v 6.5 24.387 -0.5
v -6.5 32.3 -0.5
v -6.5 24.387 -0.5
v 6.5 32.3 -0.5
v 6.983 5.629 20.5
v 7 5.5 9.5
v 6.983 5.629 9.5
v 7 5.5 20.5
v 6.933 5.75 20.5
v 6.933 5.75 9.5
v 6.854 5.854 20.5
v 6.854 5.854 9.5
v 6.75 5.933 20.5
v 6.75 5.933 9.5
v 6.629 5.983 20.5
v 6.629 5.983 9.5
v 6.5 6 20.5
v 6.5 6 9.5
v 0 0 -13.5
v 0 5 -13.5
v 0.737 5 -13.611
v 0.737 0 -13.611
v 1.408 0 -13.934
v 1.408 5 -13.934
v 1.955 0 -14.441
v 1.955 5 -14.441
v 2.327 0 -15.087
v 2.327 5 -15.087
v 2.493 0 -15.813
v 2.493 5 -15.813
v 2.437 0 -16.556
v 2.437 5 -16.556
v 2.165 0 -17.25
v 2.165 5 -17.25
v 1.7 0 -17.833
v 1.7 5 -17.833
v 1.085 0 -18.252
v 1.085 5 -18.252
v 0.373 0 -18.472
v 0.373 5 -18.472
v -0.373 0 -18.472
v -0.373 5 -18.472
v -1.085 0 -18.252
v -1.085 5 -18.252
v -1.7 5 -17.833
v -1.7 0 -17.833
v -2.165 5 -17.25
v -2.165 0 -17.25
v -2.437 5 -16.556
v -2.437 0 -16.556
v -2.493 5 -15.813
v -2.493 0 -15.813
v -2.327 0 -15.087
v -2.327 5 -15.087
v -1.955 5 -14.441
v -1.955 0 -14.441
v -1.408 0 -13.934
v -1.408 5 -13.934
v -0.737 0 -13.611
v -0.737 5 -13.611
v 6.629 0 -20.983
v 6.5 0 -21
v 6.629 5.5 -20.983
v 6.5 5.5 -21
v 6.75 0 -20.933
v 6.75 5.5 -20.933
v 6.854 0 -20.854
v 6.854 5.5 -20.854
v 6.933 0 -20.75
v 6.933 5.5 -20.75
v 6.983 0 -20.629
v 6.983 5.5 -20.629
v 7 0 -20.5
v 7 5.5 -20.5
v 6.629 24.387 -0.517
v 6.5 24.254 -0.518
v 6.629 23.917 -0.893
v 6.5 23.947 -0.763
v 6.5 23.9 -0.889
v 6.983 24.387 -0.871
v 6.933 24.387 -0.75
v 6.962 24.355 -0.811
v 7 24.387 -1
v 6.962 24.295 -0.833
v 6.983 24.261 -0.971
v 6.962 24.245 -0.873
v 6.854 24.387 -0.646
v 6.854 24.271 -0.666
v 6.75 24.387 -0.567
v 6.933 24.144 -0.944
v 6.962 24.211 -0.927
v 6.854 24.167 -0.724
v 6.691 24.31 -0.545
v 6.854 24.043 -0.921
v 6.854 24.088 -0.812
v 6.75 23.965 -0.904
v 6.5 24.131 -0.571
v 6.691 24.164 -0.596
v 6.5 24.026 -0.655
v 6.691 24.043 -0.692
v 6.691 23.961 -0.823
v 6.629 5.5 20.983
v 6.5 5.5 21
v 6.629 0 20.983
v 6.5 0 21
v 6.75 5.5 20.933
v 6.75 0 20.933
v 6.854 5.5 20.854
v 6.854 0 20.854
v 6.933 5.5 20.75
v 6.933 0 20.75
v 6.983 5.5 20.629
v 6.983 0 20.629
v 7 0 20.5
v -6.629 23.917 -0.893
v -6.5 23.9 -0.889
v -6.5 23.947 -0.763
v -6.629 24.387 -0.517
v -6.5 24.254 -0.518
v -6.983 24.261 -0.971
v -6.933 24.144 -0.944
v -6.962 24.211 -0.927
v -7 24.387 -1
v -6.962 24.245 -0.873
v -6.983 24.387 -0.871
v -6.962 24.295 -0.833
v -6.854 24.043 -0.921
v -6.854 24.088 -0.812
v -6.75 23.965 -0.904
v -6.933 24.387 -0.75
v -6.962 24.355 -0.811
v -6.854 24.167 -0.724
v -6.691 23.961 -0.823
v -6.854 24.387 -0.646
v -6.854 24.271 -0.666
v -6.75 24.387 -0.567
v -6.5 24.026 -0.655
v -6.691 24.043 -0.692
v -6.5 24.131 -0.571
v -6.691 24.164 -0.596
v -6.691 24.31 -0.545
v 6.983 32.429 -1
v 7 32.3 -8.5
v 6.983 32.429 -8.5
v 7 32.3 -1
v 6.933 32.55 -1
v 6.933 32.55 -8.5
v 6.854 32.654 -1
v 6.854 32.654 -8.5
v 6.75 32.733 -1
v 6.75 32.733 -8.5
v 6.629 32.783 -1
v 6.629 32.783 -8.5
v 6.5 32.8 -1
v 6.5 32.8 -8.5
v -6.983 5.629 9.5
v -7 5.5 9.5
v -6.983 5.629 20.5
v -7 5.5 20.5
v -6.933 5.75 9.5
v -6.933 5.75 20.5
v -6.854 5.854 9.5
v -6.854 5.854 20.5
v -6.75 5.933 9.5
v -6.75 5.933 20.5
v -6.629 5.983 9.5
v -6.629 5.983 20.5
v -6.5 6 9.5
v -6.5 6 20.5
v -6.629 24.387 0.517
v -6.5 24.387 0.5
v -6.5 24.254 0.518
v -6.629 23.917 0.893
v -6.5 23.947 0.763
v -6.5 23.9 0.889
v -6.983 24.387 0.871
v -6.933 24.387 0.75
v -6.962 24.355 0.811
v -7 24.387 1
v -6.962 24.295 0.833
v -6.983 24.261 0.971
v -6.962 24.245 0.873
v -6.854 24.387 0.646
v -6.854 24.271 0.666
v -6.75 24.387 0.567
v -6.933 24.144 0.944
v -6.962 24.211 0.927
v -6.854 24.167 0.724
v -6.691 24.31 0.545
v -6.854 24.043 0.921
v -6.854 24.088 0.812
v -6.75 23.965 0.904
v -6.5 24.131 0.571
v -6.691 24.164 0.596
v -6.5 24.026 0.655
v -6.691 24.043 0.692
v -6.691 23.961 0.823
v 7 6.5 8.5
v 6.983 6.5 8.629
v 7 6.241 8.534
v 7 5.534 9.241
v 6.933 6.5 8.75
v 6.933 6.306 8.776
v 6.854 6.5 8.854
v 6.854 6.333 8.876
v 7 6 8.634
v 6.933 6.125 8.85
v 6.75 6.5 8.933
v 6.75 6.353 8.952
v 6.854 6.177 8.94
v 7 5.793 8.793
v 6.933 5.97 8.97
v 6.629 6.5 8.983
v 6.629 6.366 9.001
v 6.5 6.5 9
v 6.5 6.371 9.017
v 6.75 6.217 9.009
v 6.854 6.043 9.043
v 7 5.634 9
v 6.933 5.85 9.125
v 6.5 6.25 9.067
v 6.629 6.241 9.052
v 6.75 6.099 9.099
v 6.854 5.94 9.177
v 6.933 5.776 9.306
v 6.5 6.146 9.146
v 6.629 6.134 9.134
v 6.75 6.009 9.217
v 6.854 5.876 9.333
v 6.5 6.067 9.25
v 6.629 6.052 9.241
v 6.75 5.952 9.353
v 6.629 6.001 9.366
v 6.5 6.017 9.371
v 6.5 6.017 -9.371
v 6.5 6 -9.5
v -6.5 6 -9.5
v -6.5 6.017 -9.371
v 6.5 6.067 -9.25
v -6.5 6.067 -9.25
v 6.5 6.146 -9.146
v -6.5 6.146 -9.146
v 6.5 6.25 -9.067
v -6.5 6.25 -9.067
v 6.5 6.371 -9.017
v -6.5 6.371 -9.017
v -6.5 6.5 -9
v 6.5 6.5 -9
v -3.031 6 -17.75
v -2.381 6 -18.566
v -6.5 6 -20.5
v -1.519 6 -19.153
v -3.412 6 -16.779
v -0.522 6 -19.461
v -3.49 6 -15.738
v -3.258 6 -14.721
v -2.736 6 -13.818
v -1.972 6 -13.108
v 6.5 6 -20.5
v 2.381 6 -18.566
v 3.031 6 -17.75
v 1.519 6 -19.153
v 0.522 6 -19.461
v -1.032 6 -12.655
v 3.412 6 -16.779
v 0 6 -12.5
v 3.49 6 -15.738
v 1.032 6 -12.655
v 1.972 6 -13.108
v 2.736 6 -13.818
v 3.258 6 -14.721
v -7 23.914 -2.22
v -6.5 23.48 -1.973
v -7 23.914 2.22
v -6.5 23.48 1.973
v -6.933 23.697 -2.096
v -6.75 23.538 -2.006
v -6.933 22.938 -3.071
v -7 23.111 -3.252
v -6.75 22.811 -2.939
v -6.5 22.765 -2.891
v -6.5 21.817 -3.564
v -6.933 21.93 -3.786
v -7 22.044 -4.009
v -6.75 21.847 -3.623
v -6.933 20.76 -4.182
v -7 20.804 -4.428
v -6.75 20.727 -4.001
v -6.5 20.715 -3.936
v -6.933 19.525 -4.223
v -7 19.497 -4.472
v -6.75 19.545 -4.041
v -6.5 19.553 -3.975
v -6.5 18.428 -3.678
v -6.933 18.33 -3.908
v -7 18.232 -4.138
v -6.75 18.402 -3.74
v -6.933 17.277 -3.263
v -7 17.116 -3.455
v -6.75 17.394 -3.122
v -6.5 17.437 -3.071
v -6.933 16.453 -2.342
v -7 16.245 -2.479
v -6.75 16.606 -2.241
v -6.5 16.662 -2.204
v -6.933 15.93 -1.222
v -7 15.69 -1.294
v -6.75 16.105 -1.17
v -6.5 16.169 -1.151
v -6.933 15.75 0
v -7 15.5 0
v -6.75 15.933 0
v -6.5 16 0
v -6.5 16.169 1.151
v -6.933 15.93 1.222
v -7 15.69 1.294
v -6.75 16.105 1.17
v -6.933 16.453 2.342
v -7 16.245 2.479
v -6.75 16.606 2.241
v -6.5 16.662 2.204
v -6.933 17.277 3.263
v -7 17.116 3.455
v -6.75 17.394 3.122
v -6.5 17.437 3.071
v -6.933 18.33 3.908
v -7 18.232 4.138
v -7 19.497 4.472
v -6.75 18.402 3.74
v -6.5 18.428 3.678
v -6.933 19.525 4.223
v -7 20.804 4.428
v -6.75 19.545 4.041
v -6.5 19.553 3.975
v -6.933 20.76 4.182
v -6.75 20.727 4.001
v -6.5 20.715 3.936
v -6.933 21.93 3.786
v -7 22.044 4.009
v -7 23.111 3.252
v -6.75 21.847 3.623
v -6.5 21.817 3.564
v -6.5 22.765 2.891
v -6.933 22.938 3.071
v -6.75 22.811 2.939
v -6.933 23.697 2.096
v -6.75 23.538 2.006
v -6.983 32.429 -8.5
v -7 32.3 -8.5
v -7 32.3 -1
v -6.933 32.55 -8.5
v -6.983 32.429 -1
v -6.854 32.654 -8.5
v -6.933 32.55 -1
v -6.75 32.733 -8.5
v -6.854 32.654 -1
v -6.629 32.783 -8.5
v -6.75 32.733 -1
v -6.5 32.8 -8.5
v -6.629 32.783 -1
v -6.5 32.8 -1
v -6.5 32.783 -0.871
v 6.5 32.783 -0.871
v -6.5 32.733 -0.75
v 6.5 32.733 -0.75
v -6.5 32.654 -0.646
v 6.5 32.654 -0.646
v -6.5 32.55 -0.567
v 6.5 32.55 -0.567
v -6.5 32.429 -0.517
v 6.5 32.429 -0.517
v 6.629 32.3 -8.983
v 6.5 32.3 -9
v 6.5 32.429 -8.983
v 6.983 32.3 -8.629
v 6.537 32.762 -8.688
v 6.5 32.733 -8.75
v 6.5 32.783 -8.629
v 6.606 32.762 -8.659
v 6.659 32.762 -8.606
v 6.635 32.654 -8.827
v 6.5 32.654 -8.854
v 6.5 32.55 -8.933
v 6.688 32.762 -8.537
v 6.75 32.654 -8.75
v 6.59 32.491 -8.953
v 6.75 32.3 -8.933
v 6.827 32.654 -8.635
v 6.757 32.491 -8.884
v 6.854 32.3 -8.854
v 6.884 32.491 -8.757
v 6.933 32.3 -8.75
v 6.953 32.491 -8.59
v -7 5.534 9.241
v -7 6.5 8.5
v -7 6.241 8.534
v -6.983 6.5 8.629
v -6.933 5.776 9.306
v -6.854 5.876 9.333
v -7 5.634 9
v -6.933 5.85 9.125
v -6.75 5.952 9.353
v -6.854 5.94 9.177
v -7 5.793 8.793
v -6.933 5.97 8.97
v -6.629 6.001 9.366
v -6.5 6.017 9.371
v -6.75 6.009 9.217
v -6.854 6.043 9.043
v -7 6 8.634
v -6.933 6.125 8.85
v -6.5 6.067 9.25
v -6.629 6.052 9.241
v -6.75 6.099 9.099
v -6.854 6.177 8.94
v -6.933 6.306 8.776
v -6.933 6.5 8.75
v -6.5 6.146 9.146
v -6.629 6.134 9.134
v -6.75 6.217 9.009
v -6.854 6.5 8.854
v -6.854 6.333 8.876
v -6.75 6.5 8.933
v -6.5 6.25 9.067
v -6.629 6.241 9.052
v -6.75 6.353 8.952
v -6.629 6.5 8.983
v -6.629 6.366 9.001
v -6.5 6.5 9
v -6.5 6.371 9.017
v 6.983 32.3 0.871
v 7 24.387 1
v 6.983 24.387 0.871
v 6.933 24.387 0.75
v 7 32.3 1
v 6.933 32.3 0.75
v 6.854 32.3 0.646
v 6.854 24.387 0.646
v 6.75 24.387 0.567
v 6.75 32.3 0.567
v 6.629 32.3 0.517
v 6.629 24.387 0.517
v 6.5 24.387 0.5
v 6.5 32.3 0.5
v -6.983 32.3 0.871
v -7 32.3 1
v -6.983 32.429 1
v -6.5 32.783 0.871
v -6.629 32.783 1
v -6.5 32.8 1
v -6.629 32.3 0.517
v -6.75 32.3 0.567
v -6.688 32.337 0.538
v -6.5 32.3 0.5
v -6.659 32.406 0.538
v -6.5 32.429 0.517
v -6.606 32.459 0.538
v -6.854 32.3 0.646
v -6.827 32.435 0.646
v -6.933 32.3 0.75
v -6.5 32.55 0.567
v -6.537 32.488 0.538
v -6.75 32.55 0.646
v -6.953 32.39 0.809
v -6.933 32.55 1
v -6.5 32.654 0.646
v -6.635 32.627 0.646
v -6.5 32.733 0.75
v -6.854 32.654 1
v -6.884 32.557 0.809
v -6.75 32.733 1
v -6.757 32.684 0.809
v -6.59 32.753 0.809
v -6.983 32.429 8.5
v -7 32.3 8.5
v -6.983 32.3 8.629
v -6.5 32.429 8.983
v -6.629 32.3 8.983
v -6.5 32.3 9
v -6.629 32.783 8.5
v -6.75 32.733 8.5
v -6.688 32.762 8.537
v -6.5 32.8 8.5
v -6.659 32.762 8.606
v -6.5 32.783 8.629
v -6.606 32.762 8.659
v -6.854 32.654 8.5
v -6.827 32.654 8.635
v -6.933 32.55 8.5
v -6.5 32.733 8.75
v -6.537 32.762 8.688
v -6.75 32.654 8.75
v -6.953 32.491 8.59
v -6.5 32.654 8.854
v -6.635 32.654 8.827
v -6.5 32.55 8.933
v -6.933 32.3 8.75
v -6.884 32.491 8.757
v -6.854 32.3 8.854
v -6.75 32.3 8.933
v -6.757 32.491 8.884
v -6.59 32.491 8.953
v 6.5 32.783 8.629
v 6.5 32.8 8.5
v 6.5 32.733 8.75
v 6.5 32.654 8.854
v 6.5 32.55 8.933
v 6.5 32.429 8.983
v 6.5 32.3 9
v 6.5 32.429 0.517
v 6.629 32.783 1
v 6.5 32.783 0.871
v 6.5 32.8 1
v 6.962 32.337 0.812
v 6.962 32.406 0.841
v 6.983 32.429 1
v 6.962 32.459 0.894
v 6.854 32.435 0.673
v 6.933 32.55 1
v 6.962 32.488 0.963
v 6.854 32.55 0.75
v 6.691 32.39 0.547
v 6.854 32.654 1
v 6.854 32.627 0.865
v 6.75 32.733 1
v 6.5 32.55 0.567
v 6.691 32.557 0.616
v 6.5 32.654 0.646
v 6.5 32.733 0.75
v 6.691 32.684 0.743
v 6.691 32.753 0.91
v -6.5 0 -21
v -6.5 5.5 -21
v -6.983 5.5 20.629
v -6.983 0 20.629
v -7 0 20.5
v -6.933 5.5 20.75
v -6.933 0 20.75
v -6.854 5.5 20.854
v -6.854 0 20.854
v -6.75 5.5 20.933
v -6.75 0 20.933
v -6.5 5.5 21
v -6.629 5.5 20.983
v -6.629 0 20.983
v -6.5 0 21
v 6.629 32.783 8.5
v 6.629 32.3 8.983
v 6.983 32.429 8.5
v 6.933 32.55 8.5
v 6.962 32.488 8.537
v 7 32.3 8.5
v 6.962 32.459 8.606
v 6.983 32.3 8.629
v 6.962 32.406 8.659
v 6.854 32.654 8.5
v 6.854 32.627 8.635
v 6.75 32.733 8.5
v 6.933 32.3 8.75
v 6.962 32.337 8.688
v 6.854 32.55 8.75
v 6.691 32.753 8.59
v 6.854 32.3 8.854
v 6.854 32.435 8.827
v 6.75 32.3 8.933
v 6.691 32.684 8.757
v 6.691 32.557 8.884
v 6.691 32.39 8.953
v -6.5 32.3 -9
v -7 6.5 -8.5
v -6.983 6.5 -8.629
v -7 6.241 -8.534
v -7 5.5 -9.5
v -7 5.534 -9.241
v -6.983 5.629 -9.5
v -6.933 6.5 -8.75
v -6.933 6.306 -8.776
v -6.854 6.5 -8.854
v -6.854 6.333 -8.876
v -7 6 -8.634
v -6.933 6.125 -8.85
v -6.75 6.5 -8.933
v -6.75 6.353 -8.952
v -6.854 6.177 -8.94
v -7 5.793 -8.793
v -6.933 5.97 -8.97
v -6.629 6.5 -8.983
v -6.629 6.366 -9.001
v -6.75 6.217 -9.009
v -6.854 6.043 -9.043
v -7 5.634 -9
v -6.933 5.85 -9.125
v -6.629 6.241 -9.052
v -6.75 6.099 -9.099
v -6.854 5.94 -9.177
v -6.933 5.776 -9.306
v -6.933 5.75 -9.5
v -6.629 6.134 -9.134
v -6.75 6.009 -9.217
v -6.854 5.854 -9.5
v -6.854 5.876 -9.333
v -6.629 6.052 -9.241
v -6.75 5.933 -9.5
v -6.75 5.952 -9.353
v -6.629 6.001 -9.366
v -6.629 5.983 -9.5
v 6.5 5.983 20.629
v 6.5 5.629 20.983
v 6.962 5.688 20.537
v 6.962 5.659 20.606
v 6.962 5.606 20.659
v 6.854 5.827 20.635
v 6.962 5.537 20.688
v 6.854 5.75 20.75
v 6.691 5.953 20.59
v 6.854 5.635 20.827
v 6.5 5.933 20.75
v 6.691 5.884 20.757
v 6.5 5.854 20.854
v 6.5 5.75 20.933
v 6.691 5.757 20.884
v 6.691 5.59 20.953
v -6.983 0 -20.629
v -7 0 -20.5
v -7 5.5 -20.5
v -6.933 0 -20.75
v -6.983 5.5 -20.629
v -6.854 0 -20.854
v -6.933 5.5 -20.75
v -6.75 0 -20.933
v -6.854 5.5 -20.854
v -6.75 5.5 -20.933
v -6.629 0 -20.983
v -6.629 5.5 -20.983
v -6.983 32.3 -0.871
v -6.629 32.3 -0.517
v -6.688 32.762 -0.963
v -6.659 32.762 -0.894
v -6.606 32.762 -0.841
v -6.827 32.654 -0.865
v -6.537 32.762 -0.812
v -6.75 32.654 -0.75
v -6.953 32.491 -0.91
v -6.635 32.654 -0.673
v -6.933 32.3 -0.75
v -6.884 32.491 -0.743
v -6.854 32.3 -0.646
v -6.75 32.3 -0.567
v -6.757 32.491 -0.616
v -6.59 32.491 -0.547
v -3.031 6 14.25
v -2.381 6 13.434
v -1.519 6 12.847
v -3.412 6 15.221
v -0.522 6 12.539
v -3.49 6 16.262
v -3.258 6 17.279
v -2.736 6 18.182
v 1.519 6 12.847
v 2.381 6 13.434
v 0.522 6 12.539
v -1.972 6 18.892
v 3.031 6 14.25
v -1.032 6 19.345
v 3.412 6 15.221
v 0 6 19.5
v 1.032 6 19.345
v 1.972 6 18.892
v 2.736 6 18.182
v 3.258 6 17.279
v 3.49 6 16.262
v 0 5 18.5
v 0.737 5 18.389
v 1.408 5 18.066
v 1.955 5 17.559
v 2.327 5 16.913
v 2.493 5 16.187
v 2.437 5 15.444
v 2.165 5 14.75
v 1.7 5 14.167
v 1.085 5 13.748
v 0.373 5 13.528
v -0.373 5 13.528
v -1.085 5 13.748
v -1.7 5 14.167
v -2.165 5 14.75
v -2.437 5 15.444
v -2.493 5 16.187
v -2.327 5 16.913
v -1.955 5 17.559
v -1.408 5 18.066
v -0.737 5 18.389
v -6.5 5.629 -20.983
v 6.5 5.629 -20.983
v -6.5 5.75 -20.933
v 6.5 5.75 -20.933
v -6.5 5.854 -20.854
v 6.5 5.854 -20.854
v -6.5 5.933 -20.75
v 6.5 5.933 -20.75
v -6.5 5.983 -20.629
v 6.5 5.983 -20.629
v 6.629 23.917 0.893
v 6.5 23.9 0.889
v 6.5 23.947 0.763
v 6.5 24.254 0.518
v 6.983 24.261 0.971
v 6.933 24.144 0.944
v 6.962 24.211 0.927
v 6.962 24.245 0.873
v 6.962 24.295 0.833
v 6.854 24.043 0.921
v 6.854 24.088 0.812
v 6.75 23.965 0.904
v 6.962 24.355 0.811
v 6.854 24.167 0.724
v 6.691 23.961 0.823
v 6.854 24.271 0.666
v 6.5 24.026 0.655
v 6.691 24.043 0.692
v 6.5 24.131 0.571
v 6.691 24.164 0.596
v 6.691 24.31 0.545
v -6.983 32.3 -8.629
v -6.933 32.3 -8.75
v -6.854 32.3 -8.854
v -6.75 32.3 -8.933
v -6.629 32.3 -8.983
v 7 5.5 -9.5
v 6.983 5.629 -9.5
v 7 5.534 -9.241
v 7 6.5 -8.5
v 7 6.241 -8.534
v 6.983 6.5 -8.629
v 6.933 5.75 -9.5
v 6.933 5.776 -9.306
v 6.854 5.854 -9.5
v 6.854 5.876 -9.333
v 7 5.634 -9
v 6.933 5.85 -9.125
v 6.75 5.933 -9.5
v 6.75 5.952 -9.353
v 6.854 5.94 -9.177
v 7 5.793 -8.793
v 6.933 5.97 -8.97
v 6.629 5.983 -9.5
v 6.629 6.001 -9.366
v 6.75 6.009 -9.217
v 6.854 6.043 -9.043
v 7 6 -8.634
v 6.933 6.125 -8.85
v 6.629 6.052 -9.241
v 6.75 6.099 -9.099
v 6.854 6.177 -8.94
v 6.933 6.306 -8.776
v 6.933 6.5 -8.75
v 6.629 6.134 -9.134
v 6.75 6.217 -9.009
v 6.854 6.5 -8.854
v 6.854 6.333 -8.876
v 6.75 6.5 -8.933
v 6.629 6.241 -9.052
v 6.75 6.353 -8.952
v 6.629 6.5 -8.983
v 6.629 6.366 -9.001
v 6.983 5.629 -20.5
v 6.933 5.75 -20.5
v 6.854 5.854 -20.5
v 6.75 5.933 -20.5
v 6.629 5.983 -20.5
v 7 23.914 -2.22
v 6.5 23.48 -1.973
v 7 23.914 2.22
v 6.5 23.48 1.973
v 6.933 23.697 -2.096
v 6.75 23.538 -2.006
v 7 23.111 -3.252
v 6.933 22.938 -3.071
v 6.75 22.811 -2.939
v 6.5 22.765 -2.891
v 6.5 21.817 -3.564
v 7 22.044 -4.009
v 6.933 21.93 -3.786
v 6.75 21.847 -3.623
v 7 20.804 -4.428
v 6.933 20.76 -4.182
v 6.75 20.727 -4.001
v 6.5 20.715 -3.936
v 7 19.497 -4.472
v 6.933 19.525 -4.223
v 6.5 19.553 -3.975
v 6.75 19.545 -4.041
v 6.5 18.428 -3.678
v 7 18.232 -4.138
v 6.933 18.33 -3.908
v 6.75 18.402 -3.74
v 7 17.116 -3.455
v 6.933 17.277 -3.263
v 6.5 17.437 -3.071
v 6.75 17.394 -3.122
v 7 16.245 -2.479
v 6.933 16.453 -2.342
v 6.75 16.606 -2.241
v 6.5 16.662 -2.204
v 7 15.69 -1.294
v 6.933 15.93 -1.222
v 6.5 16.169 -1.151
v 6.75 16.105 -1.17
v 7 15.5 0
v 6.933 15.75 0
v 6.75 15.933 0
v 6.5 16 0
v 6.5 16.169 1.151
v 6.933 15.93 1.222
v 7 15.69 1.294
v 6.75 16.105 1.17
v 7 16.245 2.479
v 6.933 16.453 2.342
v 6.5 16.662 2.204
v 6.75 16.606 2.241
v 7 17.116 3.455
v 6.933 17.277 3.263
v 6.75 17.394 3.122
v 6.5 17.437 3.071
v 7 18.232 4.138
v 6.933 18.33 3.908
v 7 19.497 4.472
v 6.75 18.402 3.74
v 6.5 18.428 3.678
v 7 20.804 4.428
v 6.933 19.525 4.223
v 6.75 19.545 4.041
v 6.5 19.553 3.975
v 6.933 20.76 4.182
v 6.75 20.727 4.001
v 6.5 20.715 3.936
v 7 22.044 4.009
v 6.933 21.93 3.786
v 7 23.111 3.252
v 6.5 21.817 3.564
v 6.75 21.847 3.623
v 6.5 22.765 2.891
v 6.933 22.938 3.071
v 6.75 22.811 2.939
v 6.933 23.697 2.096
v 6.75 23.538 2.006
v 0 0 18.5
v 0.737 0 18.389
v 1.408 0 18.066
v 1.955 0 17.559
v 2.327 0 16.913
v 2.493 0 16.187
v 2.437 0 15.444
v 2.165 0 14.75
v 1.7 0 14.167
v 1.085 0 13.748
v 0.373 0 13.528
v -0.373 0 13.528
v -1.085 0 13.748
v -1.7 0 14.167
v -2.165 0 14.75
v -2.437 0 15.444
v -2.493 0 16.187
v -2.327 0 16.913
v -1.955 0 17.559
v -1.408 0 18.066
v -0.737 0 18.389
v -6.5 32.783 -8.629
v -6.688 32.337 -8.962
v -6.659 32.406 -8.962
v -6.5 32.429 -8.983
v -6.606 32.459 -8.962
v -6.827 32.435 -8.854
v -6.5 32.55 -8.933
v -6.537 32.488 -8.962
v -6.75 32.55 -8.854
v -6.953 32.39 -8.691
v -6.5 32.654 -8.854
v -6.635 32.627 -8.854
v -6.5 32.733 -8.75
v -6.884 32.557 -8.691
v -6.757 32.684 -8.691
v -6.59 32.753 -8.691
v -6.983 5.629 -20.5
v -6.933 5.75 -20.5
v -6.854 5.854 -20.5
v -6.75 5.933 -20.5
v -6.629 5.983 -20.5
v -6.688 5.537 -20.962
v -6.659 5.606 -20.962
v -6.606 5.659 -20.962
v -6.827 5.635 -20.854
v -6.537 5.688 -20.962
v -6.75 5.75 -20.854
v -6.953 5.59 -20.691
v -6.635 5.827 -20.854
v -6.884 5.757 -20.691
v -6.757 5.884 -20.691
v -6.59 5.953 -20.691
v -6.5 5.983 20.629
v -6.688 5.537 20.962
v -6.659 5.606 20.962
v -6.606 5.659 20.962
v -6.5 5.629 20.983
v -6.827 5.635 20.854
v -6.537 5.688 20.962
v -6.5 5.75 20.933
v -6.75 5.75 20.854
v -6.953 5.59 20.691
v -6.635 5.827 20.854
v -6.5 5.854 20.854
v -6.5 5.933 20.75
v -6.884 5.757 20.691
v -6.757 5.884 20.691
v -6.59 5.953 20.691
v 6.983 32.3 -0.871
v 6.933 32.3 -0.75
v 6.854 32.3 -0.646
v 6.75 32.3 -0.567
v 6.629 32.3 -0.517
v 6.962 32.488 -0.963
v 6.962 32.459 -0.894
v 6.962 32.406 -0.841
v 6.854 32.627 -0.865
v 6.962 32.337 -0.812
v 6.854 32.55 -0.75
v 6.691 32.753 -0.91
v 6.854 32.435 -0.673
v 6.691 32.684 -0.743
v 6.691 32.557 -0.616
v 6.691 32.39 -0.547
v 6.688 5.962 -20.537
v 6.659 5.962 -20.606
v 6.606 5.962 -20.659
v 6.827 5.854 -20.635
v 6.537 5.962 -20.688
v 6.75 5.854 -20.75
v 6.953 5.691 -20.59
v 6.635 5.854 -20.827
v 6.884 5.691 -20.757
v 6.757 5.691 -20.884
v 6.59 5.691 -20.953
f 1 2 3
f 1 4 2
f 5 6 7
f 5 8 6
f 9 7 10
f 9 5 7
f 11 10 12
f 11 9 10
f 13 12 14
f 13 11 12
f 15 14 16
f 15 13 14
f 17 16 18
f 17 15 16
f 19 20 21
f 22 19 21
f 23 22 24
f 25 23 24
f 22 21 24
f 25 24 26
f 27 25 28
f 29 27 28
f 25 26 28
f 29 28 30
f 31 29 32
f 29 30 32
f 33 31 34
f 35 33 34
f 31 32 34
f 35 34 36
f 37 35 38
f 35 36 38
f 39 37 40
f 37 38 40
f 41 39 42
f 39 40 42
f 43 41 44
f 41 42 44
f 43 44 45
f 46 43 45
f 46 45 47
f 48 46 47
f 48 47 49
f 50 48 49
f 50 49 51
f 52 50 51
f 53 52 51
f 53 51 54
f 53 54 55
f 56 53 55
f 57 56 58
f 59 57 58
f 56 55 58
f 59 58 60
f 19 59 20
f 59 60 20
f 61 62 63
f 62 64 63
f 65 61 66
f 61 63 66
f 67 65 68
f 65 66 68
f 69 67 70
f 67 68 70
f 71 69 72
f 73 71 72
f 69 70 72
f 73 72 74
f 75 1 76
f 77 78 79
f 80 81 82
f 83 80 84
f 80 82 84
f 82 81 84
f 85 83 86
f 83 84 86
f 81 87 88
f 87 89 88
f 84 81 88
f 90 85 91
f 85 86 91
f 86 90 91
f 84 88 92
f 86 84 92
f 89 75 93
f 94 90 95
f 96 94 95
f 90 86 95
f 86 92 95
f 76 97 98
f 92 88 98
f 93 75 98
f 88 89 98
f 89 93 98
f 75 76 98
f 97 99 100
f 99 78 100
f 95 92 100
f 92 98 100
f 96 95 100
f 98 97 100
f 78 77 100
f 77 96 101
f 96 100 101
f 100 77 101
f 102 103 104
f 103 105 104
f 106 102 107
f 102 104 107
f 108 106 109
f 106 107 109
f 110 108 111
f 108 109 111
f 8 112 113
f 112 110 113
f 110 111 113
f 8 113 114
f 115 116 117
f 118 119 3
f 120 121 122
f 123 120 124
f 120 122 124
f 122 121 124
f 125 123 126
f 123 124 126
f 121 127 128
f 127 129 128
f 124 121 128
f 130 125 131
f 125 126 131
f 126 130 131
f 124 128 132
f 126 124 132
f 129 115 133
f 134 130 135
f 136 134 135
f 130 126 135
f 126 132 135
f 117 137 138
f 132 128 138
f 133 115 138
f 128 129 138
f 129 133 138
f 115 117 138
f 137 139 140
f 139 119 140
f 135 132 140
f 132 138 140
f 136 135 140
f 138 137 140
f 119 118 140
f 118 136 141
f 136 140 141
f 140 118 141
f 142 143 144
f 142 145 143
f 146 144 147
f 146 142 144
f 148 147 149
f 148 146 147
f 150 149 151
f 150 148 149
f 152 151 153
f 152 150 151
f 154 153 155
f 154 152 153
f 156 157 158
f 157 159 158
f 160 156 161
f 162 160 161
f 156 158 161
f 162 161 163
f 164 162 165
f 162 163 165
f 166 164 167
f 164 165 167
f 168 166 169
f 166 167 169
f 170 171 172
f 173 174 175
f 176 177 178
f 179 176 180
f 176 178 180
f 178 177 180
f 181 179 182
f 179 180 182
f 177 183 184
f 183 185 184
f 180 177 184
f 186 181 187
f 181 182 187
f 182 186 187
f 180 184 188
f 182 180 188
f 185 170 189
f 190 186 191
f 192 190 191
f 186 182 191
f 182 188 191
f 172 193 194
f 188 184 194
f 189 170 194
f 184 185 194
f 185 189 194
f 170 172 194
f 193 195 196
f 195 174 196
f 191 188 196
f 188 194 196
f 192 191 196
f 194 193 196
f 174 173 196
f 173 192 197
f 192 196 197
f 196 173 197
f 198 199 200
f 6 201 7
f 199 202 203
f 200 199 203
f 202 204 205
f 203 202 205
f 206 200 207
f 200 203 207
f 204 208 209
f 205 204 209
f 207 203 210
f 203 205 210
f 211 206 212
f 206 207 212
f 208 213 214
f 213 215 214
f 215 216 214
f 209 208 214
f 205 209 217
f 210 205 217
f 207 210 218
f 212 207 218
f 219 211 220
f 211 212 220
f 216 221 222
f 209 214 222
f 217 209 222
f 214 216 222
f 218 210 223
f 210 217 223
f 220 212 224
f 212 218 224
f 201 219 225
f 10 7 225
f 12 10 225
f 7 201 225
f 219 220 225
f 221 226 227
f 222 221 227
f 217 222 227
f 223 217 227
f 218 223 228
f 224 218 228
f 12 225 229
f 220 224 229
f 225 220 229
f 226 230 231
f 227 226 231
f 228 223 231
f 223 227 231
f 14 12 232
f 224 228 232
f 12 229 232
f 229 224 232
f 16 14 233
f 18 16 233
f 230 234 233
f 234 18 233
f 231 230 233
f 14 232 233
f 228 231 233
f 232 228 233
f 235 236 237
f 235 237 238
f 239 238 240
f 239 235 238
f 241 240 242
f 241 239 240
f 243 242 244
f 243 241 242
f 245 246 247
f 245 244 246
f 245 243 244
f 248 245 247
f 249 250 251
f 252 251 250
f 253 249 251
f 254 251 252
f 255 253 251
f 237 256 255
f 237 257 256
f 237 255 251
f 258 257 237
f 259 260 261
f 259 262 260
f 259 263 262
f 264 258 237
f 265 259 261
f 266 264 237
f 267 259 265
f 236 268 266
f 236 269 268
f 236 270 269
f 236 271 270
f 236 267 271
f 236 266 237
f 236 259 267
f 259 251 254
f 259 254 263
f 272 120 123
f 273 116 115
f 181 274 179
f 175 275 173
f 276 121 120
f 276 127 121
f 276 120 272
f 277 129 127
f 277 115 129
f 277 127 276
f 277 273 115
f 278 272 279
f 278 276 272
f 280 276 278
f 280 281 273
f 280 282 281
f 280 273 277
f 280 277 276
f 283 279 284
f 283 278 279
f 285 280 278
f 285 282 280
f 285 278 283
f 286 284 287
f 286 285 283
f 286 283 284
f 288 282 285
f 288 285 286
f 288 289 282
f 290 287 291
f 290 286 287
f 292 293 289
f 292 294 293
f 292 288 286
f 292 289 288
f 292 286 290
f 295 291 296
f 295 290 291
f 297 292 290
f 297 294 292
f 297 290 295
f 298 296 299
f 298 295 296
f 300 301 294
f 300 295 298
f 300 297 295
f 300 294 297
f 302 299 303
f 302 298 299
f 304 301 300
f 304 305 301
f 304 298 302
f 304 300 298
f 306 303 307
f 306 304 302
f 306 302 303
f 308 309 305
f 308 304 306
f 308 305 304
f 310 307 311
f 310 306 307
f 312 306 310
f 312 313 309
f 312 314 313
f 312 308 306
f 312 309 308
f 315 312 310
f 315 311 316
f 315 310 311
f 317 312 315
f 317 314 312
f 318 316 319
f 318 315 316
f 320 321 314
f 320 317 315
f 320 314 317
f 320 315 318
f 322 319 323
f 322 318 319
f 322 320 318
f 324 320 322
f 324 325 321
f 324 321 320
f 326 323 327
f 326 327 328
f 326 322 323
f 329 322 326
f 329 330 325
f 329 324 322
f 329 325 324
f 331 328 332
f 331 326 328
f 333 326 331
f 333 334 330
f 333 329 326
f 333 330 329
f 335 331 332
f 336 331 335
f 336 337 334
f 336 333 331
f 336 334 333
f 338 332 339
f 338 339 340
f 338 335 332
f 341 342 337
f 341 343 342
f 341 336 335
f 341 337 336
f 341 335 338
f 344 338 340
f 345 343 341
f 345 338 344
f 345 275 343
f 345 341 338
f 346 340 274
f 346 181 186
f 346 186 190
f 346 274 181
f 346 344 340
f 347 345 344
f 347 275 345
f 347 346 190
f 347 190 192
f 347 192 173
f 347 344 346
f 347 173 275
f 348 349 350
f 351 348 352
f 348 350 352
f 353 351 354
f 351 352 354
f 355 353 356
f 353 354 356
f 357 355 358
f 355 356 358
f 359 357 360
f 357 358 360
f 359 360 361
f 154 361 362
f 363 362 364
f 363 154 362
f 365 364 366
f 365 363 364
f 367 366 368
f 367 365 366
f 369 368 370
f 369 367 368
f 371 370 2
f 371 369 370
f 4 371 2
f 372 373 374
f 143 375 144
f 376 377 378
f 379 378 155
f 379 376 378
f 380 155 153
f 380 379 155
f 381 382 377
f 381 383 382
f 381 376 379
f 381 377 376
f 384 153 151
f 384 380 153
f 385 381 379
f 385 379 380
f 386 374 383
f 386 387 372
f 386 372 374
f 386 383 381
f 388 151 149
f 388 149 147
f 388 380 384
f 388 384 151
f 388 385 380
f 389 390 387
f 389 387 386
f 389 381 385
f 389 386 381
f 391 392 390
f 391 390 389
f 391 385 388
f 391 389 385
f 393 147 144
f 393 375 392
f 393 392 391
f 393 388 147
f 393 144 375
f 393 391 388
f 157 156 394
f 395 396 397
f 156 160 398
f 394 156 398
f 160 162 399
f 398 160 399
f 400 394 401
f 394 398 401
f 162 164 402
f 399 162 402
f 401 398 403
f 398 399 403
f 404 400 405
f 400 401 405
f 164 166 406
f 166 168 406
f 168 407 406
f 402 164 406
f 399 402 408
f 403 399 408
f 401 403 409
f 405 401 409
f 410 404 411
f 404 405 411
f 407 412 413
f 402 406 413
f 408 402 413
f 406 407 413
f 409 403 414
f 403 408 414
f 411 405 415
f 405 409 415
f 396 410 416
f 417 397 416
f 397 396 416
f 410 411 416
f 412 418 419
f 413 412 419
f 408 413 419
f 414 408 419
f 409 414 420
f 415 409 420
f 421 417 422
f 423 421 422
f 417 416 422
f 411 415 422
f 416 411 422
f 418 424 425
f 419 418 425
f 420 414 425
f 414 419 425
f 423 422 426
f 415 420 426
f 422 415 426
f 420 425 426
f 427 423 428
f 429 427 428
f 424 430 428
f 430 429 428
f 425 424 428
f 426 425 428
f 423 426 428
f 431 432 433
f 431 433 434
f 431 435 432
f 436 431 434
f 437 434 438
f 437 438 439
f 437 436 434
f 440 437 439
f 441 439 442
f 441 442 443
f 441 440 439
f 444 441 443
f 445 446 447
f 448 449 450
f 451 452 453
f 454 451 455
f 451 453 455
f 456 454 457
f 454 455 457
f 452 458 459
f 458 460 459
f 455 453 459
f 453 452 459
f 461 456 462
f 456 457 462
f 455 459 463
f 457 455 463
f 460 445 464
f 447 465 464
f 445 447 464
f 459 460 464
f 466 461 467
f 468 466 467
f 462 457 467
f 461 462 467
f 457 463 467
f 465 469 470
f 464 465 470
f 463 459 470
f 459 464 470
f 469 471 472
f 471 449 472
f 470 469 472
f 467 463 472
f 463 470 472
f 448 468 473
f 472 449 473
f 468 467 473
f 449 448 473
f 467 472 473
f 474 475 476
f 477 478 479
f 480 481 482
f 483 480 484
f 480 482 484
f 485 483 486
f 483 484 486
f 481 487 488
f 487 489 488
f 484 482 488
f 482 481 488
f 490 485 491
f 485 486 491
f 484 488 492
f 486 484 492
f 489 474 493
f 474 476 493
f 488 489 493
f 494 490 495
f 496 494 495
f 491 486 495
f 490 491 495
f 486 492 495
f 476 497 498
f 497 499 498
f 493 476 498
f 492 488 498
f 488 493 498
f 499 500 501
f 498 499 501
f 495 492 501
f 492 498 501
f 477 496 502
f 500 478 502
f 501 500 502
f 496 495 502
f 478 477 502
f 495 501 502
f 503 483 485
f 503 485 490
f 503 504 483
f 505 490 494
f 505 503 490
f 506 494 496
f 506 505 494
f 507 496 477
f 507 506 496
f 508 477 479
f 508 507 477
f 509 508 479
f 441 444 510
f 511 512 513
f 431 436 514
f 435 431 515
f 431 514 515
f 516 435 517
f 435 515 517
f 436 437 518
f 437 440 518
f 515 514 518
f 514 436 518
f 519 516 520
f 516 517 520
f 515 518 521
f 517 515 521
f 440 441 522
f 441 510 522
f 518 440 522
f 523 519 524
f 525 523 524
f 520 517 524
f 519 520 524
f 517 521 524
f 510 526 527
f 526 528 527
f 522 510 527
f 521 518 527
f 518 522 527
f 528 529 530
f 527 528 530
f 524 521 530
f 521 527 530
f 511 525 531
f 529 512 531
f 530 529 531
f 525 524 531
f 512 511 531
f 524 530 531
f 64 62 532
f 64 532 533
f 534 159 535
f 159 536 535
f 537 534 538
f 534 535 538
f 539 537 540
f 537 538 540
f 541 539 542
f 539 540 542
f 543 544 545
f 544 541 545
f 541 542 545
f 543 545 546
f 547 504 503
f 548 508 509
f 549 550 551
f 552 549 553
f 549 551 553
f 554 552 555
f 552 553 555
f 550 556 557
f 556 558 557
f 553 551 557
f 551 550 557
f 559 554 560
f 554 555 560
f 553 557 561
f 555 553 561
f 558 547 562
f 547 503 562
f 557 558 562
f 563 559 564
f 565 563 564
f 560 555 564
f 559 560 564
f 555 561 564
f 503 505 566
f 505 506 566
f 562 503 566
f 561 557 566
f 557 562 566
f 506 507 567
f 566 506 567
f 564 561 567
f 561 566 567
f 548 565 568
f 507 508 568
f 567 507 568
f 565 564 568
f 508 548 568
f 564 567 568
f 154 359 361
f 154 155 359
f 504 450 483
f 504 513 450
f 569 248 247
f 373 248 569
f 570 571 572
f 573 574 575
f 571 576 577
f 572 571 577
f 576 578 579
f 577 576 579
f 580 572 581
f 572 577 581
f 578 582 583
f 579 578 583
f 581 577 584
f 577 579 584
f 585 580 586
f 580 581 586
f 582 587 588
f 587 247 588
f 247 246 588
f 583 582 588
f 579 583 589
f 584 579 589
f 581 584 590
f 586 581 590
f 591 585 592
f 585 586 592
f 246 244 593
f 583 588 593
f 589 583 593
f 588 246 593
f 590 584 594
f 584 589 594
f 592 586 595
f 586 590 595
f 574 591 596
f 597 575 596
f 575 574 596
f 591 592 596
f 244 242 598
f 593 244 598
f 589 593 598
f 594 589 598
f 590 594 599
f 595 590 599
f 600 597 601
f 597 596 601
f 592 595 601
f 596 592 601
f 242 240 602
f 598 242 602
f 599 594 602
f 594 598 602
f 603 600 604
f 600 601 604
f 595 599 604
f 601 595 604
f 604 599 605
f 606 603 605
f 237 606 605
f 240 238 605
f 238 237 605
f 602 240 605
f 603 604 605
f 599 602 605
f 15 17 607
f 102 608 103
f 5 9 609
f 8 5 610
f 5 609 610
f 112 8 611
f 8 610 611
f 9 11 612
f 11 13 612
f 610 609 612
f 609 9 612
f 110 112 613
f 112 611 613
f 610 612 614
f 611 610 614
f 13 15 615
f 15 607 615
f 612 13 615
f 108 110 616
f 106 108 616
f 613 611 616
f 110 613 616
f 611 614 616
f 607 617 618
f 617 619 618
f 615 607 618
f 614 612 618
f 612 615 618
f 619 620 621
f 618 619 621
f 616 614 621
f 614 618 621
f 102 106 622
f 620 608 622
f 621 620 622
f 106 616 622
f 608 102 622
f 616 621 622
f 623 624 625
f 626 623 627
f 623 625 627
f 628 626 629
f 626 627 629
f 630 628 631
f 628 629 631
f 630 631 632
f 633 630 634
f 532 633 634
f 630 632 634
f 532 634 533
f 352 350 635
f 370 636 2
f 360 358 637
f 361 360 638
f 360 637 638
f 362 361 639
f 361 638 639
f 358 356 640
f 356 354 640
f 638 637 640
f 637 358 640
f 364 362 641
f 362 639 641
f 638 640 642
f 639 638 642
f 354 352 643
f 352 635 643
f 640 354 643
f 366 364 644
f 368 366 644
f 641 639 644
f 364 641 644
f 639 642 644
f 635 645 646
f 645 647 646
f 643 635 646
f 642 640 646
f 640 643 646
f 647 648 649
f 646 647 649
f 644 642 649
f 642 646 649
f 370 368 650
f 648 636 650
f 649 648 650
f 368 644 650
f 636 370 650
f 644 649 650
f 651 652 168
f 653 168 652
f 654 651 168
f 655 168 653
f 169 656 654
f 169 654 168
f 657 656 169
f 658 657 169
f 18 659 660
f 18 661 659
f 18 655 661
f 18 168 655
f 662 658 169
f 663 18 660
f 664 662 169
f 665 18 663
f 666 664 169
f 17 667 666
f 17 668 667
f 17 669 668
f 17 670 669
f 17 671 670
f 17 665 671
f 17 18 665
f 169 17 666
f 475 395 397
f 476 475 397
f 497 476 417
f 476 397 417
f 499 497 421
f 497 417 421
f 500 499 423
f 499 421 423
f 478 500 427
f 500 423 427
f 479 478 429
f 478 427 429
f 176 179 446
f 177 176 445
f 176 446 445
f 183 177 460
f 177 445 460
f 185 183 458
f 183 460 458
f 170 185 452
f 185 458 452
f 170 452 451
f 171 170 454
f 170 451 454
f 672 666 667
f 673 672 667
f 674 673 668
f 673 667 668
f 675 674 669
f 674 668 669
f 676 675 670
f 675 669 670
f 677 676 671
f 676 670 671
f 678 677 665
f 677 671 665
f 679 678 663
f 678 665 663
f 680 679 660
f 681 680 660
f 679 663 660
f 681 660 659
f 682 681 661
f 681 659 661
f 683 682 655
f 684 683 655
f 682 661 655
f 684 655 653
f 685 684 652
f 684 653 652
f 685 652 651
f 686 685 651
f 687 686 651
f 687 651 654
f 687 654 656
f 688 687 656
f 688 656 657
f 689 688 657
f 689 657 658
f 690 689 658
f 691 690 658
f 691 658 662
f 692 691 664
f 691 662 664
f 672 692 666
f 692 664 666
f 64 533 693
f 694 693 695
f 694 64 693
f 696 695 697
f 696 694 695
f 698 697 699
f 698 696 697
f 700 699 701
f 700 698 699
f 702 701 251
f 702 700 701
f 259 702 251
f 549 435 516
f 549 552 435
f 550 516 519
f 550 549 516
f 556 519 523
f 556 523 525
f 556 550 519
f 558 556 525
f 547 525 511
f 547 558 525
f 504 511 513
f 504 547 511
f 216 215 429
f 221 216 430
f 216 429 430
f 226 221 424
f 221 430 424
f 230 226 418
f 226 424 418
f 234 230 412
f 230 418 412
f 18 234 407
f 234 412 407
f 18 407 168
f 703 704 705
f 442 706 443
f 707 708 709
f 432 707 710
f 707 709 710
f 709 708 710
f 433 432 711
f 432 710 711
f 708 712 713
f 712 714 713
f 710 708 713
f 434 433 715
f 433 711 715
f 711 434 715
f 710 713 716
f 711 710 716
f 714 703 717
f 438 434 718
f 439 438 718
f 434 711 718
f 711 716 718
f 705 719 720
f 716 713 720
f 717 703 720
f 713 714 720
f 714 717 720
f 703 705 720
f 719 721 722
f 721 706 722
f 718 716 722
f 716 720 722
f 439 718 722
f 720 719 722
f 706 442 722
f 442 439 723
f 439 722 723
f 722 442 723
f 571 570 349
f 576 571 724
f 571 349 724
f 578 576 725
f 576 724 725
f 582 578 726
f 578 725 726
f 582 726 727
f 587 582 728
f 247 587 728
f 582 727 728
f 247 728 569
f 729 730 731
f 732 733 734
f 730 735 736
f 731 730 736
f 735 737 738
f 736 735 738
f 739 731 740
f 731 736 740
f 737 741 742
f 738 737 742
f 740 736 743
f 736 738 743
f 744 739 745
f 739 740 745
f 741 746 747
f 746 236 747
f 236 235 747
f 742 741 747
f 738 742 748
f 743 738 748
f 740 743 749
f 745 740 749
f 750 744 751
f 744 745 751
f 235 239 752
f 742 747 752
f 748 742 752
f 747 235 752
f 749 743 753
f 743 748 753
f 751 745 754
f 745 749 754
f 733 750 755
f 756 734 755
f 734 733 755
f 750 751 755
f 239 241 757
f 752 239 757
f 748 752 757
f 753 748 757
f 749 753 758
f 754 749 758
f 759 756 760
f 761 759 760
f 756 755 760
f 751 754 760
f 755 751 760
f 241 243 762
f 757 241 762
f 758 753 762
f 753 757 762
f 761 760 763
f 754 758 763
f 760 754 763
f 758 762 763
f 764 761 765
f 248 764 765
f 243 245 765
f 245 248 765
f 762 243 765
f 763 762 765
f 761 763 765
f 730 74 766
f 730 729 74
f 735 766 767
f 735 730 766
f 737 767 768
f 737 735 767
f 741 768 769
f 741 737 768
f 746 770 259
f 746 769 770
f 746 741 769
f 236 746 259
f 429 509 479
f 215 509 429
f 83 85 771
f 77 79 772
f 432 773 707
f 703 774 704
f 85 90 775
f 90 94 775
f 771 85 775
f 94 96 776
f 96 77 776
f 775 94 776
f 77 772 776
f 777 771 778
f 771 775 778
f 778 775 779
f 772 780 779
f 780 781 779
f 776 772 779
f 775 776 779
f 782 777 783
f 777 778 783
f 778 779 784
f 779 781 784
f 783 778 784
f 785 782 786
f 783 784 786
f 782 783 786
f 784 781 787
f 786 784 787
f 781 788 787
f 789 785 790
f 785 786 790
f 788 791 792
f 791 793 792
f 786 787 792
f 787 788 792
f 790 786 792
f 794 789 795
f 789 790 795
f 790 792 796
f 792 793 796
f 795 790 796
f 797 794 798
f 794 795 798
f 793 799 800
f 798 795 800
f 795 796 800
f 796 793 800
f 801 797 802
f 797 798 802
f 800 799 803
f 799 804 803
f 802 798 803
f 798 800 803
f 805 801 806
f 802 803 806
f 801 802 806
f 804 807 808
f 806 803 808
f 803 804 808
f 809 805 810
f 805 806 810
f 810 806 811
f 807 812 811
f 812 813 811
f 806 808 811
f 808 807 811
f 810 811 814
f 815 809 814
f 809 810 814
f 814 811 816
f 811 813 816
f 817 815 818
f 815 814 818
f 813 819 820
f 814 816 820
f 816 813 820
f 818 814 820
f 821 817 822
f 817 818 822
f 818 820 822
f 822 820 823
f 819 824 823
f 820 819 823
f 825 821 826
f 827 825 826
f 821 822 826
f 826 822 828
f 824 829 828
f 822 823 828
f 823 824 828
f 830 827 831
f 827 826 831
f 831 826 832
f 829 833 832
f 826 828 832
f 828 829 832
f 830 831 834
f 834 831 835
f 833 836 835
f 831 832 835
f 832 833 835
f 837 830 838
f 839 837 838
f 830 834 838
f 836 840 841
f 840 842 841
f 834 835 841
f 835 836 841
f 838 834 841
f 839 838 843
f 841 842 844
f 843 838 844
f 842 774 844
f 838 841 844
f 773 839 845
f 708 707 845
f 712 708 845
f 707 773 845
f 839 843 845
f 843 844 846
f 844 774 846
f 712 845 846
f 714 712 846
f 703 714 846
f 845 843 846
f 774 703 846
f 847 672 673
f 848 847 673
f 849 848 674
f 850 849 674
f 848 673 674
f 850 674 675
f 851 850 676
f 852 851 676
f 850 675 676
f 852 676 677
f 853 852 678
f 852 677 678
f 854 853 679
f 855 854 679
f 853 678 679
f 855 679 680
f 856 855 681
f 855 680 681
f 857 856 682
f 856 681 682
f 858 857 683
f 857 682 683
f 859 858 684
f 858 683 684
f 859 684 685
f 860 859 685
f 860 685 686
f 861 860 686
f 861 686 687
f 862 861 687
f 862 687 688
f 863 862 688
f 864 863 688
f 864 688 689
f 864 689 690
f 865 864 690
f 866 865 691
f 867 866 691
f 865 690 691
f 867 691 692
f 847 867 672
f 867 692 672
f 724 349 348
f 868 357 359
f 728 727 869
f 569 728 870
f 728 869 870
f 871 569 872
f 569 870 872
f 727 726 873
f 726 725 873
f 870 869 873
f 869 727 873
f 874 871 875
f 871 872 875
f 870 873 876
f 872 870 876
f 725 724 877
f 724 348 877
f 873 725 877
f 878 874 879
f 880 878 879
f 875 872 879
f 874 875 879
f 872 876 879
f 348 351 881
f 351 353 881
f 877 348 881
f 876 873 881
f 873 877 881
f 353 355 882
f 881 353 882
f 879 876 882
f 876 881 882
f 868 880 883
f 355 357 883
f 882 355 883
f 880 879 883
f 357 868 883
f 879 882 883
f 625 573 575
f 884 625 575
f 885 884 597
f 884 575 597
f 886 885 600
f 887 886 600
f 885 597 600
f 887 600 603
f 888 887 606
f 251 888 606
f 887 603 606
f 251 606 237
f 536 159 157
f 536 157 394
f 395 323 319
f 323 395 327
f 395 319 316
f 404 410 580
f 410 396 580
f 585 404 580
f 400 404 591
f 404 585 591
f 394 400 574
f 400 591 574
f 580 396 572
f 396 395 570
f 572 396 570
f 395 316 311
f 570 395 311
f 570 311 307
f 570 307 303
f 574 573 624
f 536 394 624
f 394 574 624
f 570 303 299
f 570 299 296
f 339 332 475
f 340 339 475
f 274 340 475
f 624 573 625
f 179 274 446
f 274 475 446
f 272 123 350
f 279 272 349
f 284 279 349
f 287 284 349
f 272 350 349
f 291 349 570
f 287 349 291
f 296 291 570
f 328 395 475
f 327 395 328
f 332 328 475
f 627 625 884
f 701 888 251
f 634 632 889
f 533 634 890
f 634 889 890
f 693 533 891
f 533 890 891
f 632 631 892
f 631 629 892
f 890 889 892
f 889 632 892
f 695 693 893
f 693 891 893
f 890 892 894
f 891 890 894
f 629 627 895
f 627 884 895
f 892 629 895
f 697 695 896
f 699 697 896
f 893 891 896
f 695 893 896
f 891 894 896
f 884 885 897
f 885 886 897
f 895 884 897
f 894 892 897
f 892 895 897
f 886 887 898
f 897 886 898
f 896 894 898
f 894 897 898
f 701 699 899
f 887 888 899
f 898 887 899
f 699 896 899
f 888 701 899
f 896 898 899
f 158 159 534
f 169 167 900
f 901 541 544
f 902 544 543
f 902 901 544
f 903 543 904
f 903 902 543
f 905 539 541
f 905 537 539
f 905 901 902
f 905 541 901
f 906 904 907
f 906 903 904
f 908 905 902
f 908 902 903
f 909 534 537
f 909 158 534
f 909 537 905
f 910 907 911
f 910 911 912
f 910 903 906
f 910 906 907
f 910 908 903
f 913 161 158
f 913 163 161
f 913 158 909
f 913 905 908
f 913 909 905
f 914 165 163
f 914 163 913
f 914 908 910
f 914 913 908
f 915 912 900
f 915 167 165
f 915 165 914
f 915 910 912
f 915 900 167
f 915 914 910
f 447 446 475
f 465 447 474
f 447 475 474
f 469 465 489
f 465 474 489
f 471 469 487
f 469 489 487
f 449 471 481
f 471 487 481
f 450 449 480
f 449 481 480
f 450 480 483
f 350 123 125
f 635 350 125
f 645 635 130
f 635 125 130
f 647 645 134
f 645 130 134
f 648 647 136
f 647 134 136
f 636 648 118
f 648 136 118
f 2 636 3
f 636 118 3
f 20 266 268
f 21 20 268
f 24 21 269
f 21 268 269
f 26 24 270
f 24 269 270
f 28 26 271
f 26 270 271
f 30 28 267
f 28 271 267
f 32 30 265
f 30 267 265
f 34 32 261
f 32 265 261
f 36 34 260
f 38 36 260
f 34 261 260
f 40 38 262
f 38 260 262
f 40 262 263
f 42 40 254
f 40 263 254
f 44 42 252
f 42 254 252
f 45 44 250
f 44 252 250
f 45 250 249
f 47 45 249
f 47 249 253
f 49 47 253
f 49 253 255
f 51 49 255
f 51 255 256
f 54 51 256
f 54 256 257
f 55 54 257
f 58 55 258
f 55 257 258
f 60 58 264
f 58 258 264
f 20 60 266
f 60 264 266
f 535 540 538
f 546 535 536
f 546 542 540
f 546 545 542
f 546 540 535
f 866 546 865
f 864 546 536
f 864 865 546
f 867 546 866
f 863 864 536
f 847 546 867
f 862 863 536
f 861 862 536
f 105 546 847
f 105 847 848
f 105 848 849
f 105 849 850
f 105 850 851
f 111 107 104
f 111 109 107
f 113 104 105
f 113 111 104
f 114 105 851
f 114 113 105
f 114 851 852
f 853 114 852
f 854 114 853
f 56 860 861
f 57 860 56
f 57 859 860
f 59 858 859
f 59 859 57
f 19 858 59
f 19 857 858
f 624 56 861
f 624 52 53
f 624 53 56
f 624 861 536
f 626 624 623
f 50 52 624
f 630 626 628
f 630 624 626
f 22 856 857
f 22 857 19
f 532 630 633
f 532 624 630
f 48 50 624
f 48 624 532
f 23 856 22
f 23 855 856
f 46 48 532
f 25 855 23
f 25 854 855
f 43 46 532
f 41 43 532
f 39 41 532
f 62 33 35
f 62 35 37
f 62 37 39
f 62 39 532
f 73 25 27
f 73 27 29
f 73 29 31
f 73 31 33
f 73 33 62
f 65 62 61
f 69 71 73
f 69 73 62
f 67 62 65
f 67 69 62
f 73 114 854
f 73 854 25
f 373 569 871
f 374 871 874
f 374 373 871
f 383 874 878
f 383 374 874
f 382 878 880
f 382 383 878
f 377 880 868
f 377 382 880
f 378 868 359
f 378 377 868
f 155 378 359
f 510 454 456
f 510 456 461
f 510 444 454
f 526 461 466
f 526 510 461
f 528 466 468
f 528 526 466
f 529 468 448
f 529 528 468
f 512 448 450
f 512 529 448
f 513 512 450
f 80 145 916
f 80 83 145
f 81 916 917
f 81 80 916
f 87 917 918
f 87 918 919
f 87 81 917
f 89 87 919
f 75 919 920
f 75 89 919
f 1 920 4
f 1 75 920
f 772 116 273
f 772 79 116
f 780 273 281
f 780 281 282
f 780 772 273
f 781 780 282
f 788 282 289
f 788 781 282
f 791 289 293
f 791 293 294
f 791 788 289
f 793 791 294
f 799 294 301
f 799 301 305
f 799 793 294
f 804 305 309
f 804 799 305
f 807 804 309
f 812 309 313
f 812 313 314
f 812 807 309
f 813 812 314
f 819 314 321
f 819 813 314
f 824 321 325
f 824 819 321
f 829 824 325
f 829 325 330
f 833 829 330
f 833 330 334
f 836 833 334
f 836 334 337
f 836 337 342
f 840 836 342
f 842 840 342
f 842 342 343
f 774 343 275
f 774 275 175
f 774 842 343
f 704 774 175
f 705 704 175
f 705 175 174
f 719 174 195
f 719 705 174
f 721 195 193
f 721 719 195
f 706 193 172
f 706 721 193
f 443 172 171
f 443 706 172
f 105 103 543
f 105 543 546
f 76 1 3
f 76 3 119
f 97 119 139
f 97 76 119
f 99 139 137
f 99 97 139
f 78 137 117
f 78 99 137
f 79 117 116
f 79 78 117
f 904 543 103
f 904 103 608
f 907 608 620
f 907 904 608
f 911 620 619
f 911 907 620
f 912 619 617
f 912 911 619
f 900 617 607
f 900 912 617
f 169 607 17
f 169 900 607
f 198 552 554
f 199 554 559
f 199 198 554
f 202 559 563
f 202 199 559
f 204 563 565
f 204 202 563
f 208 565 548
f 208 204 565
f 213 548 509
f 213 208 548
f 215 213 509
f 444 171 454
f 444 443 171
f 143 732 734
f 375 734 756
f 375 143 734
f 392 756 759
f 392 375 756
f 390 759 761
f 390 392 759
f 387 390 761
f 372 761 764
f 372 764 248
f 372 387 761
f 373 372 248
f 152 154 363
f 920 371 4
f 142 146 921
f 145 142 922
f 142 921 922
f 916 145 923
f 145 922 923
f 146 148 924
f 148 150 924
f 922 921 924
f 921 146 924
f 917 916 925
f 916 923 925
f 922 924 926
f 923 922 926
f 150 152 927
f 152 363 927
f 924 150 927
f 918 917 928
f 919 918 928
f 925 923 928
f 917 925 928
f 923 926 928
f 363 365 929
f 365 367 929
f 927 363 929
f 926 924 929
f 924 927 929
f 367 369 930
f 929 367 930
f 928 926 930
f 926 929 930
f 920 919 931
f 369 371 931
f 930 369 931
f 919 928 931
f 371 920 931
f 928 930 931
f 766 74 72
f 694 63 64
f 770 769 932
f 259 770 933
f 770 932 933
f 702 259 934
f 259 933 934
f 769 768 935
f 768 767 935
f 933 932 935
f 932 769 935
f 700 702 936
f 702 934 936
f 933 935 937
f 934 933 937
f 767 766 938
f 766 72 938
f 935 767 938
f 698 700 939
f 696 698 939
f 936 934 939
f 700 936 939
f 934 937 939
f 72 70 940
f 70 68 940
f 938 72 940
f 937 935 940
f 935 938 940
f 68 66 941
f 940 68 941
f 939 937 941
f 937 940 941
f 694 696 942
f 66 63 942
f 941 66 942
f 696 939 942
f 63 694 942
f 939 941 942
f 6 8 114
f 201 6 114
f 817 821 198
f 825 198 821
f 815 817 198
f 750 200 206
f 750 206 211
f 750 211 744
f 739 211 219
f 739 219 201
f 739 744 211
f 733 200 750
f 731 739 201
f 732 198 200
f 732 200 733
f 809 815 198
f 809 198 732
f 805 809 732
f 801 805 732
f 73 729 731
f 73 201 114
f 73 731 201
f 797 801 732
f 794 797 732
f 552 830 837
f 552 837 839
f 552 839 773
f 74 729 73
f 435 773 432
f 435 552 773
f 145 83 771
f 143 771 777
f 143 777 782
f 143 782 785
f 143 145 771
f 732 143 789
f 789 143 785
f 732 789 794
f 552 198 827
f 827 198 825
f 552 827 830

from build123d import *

# Parameters (mm, degrees)
BOSS_EXTRUDE1_DEPTH = 7
SKETCH3_R           = 2.5
CUT_EXTRUDE1_DEPTH  = 6
FILLET2_R           = 0.5
CHAMFER1_SIZE       = 1


with BuildPart() as part:
    # Sketch1 → Boss-Extrude1 (new, symmetric)
    with BuildSketch(Plane(origin=(0, 0, 0), x_dir=(0, 0, -1), z_dir=(1, 0, 0))):
        with BuildLine():
            Line((-21, 0), (21, 0))
            Line((21, 0), (21, 6))
            Line((21, 6), (9, 6))
            Line((9, 6), (9, 32.8))
            Line((9, 32.8), (0.5, 32.8))
            Line((0.5, 32.8), (0.5, 23.968626967))
            ThreePointArc((0.5, 23.968626967), (0, 16), (-0.5, 23.968626967))
            Line((-0.5, 23.968626967), (-0.5, 32.8))
            Line((-0.5, 32.8), (-9, 32.8))
            Line((-9, 32.8), (-9, 6))
            Line((-9, 6), (-21, 6))
            Line((-21, 6), (-21, 0))
        make_face()
    extrude(amount=BOSS_EXTRUDE1_DEPTH, both=True)

    # Sketch3 → Cut-Extrude1 (cut)
    with BuildSketch(Plane(origin=(0, 6, 0), x_dir=(1, 0, 0), z_dir=(0, 1, 0))):
        with Locations(Location((0, 16, 0), (0, 0, 270))):
            Circle(SKETCH3_R)
        with Locations(Location((0, -16, 0), (0, 0, 270))):
            Circle(SKETCH3_R)
    extrude(amount=-CUT_EXTRUDE1_DEPTH, mode=Mode.SUBTRACT)

    # Fillet2
    fillet2_edges = [part.edges().sort_by_distance(p)[0] for p in [
        (-7, 6, 15),
        (-7, 19.4, 9),
        (7, 3, -21),
        (-7, 32.8, 4.75),
        (-7, 28.384313483, 0.5),
        (-7, 16, 0),
        (-7, 28.384313483, -0.5),
        (-7, 32.8, -4.75),
        (-7, 19.4, -9),
        (-7, 6, -15),
        (-7, 3, -21),
        (-7, 3, 21),
        (7, 6, -15),
        (0, 6, 21),
        (0, 6, 9),
        (0, 32.8, 9),
        (7, 19.4, -9),
        (0, 32.8, 0.5),
        (0, 23.968626967, 0.5),
        (0, 23.968626967, -0.5),
        (0, 32.8, -0.5),
        (0, 32.8, -9),
        (0, 6, -9),
        (0, 6, -21),
        (7, 32.8, -4.75),
        (7, 28.384313483, -0.5),
        (7, 16, 0),
        (7, 28.384313483, 0.5),
        (7, 32.8, 4.75),
        (7, 19.4, 9),
        (7, 6, 15),
        (7, 3, 21),
    ]]
    fillet(fillet2_edges, radius=FILLET2_R)

    # Chamfer1
    chamfer1_edges = [part.edges().sort_by_distance(p)[0] for p in [
        (0, 6, -18.5),
        (0, 6, 13.5),
    ]]
    chamfer(chamfer1_edges, length=CHAMFER1_SIZE)


solid = part.part
